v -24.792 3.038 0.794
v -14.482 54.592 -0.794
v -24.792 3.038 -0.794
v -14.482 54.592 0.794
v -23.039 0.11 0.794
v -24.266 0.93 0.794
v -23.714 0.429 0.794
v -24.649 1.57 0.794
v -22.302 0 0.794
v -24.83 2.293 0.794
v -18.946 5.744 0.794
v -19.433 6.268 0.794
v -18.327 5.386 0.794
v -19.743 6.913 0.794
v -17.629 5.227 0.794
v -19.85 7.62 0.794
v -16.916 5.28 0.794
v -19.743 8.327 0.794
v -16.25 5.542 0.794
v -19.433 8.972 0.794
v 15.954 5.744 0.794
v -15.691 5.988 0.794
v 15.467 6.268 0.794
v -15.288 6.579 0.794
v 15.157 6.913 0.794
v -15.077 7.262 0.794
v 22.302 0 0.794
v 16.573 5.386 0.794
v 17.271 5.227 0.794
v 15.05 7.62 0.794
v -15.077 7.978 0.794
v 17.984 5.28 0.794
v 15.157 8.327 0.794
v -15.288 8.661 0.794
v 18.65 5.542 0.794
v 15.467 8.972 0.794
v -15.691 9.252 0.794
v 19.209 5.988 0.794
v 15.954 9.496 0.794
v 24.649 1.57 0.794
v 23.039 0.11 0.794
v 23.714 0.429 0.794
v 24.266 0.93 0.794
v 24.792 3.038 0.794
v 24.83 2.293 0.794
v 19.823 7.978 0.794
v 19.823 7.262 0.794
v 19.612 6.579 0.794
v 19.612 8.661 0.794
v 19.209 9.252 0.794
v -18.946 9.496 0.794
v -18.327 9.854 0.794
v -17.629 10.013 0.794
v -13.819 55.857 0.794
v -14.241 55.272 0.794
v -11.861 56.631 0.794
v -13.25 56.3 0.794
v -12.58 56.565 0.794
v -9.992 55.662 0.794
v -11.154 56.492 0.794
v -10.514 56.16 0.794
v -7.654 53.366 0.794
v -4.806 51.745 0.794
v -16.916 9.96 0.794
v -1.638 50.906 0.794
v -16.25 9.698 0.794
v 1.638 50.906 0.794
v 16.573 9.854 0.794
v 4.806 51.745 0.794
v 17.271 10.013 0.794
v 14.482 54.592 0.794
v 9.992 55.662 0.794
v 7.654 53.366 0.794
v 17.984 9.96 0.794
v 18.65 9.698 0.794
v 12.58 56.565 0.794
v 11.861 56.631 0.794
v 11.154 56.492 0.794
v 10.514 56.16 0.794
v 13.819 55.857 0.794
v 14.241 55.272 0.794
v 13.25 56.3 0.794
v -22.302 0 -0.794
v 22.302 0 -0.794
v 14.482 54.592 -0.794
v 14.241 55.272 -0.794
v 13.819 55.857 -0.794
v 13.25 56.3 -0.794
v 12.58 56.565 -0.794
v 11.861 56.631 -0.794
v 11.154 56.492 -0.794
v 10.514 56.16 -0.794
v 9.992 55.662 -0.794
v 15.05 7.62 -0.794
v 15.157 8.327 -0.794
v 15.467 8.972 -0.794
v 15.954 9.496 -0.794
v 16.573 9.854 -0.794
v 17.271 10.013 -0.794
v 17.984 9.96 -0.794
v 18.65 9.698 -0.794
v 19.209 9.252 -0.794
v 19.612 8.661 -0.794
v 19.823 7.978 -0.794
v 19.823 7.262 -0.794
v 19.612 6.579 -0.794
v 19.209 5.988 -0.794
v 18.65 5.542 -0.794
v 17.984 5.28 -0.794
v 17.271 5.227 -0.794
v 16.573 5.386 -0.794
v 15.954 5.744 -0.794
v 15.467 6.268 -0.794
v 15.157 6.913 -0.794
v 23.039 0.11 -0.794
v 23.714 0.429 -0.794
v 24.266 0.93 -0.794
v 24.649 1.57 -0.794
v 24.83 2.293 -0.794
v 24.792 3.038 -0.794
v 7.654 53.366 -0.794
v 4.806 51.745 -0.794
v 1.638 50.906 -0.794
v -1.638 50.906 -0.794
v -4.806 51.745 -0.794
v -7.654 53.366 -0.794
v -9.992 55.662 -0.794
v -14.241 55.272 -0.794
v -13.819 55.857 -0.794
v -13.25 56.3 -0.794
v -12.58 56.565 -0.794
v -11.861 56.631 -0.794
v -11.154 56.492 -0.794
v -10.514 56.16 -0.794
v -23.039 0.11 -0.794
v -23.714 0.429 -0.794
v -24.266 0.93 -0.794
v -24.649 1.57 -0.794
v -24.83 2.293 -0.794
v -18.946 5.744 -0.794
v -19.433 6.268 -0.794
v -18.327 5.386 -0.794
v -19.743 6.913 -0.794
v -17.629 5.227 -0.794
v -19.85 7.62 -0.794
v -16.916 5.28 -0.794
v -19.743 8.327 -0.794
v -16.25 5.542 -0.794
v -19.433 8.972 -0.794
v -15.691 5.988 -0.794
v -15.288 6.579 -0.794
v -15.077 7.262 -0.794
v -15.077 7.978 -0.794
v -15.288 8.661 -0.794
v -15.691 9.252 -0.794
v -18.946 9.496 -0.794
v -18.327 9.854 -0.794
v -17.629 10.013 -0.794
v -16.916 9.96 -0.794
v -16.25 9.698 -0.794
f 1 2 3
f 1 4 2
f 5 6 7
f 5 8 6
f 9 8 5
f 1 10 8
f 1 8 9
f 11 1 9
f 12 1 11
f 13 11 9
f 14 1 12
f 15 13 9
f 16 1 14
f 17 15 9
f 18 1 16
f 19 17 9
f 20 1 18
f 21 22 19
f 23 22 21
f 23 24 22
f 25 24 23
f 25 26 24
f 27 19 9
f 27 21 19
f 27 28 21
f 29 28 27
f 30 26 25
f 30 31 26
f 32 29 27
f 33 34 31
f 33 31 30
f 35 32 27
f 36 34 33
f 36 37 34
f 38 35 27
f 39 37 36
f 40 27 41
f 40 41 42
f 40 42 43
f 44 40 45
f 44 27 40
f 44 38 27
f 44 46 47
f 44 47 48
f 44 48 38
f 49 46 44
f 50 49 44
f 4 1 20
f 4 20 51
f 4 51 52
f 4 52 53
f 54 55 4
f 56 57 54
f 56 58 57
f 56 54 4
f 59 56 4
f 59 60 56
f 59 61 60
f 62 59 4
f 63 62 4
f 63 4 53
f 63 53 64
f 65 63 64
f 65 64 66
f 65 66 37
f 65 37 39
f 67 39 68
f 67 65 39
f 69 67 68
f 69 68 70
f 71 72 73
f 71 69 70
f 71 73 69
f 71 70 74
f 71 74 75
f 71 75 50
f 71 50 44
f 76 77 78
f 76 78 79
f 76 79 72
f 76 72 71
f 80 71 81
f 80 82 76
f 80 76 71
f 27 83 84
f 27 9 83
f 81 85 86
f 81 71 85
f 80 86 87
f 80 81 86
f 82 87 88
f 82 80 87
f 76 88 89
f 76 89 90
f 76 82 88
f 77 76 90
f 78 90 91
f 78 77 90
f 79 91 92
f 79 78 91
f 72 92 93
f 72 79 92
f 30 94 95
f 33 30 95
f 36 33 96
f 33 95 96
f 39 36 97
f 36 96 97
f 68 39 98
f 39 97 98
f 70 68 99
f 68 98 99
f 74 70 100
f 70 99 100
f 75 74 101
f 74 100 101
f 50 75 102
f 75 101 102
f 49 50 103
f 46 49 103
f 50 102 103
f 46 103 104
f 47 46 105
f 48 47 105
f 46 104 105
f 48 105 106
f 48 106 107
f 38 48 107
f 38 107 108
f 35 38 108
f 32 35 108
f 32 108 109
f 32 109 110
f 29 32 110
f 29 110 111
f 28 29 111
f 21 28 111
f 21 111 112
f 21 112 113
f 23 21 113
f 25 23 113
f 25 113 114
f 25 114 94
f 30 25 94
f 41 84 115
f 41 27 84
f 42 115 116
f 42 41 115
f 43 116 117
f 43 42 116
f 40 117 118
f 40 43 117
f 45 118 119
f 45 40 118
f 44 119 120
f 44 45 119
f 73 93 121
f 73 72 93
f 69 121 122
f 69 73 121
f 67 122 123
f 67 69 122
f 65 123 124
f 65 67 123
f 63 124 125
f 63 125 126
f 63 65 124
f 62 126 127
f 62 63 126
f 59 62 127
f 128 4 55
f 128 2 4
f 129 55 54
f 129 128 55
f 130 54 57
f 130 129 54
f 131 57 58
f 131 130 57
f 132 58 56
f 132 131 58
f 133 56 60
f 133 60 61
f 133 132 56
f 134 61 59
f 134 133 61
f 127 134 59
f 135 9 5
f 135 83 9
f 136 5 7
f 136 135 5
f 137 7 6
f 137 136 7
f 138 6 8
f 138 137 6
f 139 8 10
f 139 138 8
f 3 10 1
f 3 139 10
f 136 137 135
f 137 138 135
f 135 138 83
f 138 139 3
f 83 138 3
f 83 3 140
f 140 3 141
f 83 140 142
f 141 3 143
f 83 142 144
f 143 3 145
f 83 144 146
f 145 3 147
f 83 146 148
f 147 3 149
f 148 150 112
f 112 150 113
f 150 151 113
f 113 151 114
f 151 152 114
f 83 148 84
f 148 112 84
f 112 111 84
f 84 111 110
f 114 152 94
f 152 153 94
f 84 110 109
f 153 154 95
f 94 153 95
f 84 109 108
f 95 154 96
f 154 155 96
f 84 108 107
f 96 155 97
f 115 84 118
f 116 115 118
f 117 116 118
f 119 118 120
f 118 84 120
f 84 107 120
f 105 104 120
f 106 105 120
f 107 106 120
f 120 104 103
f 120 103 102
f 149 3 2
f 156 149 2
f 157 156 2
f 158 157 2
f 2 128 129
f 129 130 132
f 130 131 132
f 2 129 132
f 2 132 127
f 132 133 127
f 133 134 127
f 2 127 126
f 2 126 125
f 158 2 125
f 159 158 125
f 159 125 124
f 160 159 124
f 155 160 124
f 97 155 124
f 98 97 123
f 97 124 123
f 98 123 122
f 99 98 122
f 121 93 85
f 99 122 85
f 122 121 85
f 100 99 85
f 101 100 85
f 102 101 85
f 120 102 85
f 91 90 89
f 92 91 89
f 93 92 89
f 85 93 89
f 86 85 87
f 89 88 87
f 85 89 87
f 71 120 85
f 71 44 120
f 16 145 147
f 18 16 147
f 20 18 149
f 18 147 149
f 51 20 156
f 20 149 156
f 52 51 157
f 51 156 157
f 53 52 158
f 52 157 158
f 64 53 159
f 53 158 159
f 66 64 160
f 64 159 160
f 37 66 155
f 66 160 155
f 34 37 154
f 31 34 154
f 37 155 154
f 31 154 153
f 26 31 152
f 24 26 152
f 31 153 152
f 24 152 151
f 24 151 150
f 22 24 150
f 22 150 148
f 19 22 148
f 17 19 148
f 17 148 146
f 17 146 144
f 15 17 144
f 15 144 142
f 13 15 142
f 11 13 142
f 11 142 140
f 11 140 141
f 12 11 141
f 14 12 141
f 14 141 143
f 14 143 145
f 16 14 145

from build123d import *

# Parameters (mm, degrees)
BOSS_EXTRUDE1_DEPTH  = 0.79375
M4_CLEARANCE_HOLE1_D = 4.8
FILLET1_R            = 2.54


with BuildPart() as part:
    # Sketch1 → Boss-Extrude1 (new, symmetric)
    with BuildSketch(Plane.XY):
        with BuildLine():
            Line((-25.4, 0), (25.4, 0))
            Line((25.4, 0), (12.7, 63.5))
            ThreePointArc((12.7, 63.5), (0, 50.8), (-12.7, 63.5))
            Line((-12.7, 63.5), (-25.4, 0))
        make_face()
    extrude(amount=BOSS_EXTRUDE1_DEPTH, both=True)

    # M4 Clearance Hole1 (through all)
    with Locations(Plane.XY.offset(0.79375)):
        with Locations((17.45, 7.62), (-17.45, 7.62)):
            Hole(M4_CLEARANCE_HOLE1_D / 2)

    # Fillet1
    fillet1_edges = [part.edges().sort_by_distance(p)[0] for p in [
        (12.7, 63.5, 0),
        (25.4, 0, 0),
        (-25.4, 0, 0),
        (-12.7, 63.5, 0),
    ]]
    fillet(fillet1_edges, radius=FILLET1_R)


solid = part.part
